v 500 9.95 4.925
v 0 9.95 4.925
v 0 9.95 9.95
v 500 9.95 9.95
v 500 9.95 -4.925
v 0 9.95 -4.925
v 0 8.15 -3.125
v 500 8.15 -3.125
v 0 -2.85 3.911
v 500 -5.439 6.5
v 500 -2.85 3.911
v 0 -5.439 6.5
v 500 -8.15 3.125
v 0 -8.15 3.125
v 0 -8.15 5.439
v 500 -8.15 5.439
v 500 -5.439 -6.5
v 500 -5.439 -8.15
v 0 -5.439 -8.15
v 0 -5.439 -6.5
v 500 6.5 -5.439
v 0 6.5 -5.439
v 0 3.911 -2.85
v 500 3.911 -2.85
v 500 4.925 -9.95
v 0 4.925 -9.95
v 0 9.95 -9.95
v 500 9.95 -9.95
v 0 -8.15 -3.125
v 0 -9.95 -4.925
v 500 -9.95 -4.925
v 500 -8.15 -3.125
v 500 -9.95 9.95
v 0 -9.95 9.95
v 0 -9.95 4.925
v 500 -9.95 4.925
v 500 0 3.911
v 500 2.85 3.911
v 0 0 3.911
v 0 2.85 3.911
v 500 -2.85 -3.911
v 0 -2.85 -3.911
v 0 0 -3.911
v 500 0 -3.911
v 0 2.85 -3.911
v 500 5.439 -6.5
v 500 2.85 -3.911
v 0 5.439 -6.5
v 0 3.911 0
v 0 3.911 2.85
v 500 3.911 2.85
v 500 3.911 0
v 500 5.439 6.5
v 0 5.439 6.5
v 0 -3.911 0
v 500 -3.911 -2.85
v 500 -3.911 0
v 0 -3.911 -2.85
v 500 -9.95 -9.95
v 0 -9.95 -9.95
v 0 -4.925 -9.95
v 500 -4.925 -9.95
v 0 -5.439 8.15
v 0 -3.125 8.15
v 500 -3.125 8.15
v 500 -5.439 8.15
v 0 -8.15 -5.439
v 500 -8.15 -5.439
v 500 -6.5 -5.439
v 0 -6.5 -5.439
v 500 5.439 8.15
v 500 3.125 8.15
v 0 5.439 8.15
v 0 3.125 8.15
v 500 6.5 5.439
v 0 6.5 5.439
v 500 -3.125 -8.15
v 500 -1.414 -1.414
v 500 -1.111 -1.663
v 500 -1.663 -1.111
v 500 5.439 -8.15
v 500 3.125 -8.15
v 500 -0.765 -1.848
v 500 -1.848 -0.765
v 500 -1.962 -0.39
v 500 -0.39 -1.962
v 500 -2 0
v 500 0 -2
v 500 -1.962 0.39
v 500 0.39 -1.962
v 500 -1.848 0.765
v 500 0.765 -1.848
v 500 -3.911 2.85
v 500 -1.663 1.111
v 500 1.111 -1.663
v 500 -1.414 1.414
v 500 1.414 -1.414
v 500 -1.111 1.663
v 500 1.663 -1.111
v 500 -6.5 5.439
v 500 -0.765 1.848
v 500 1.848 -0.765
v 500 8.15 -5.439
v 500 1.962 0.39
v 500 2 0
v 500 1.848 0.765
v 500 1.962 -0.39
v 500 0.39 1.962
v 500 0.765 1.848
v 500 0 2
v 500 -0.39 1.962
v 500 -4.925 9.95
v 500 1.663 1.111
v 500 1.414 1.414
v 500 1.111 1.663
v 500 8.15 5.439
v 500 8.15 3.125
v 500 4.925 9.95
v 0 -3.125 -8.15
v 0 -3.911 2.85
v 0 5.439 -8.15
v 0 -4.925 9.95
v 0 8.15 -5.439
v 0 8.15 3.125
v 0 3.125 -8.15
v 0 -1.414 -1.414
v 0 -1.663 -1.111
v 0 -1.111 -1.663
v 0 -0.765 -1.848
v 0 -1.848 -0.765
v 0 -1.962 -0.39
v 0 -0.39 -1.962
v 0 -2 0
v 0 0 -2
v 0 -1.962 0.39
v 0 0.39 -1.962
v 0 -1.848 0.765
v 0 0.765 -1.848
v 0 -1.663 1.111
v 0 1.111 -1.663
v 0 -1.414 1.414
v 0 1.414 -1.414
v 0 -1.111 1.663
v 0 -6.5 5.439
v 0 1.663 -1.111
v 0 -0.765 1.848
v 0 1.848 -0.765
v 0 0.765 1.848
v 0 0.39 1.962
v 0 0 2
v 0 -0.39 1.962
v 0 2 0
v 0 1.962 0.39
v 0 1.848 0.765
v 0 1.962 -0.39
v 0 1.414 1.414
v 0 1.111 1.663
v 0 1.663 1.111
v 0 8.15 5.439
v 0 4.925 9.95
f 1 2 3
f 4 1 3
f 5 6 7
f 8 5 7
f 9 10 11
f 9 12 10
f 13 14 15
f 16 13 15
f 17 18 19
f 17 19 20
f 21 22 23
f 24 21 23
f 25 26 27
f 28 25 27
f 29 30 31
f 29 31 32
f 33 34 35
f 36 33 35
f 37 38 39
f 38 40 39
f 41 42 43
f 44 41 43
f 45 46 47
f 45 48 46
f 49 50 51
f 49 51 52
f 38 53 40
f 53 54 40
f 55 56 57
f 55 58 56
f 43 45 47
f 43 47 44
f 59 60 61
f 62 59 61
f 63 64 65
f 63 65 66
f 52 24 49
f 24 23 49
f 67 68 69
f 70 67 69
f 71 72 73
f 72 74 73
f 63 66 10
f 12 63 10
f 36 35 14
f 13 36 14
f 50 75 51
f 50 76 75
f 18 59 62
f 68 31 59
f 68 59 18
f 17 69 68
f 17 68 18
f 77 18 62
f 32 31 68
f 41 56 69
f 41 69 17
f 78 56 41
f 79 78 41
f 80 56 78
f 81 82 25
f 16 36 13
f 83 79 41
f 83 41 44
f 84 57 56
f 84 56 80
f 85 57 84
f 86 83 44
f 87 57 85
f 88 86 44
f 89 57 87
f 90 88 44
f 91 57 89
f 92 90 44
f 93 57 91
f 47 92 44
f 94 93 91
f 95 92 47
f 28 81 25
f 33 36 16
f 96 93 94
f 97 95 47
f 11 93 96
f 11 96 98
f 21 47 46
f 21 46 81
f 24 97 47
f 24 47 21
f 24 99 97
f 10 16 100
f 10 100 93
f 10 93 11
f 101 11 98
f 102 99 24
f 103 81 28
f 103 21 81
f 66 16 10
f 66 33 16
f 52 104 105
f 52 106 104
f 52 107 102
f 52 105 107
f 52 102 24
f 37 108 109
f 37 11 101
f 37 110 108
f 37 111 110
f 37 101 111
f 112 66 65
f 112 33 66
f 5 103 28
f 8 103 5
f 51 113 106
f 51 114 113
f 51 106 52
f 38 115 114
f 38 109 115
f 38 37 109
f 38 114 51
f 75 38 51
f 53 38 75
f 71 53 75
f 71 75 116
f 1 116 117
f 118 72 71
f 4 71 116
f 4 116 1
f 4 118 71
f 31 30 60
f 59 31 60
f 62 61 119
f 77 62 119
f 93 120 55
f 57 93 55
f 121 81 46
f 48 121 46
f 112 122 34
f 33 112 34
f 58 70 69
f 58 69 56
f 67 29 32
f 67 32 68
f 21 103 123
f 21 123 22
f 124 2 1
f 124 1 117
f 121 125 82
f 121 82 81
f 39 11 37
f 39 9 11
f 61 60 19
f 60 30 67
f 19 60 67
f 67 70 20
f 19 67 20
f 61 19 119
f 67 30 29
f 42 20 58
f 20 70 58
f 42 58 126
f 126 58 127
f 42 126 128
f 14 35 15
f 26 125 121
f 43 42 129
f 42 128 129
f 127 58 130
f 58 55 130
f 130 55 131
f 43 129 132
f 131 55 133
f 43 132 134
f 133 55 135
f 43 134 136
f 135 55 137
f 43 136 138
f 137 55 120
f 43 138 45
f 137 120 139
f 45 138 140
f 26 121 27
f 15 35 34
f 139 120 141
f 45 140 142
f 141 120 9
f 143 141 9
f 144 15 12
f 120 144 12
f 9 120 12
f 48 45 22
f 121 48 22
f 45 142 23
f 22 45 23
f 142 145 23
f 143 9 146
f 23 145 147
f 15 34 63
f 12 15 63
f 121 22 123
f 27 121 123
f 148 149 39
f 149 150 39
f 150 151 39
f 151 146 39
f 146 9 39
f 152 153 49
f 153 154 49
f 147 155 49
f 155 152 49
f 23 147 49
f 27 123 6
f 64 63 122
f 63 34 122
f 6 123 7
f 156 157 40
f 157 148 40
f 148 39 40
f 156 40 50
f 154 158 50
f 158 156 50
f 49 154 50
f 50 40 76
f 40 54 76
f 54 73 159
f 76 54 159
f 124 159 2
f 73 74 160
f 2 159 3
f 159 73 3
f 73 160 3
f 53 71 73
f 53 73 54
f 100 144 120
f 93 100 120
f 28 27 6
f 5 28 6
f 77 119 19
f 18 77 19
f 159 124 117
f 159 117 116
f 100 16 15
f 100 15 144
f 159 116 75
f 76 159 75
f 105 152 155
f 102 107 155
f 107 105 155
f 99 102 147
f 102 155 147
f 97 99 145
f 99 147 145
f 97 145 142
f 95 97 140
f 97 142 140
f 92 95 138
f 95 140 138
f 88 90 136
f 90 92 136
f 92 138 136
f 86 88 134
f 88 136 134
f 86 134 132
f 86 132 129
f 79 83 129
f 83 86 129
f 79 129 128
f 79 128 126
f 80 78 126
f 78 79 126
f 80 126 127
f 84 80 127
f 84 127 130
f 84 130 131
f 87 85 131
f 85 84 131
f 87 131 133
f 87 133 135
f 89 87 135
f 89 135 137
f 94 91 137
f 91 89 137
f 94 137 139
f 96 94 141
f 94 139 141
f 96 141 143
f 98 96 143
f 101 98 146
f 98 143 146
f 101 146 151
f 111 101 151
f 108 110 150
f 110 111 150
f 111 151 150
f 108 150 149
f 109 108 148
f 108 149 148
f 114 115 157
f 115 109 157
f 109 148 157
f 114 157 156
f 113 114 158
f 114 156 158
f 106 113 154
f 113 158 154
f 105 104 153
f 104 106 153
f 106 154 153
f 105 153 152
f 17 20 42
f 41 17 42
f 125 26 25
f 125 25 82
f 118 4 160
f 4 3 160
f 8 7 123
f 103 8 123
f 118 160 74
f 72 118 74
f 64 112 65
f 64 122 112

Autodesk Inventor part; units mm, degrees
ref_plane "YZ Plane" through (0, 0, 0) normal (1, 0, 0) x (0, 1, 0)
ref_plane "XZ Plane" through (0, 0, 0) normal (0, 1, 0) x (-1, 0, 0)
ref_plane "XY Plane" through (0, 0, 0) normal (0, 0, 1) x (1, 0, 0)
sketch "Sketch1" plane through (0, 0, 0) normal (1, 0, 0) x (0, 1, 0)
  line L0 (-9.95, -9.95) -> (9.95, -9.95) construction
  line L1 (9.95, 9.95) -> (-9.95, 9.95) construction
  line L2 (-9.95, 9.95) -> (-9.95, -9.95) construction
  line L3 (-9.95, -9.95) -> (9.95, 9.95) construction
  line L4 (9.95, -9.95) -> (-9.95, 9.95) construction
  line L5 (9.95, 4.925) -> (8.15, 3.125)
  line L6 (8.15, 3.125) -> (8.15, 5.4393)
  line L7 (8.15, 5.4393) -> (6.5, 5.4393)
  line L8 (6.5, 5.4393) -> (3.9107, 2.85)
  line L9 (3.9107, 2.85) -> (3.9107, 0)
  line L10 (9.95, -4.925) -> (8.15, -3.125)
  line L11 (8.15, -3.125) -> (8.15, -5.4393)
  line L12 (3.9107, -2.85) -> (3.9107, 0)
  line L13 (0, 0) -> (6.8658, 0) construction
  line L14 (8.15, -5.4393) -> (6.5, -5.4393)
  line L15 (6.5, -5.4393) -> (3.9107, -2.85)
  circle A0 centre (0, 0) radius 2
  line L16 (9.95, -9.95) -> (9.95, -4.925)
  line L17 (9.95, 4.925) -> (9.95, 9.95)
  line L18 (-4.925, 9.95) -> (-9.95, 9.95)
  line L19 (-4.925, 9.95) -> (-3.125, 8.15)
  line L20 (-5.4393, 6.5) -> (-2.85, 3.9107)
  line L21 (-5.4393, 8.15) -> (-5.4393, 6.5)
  line L22 (-3.125, 8.15) -> (-5.4393, 8.15)
  line L23 (-2.85, 3.9107) -> (0, 3.9107)
  line L24 (2.85, 3.9107) -> (0, 3.9107)
  line L25 (5.4393, 6.5) -> (2.85, 3.9107)
  line L26 (5.4393, 8.15) -> (5.4393, 6.5)
  line L27 (3.125, 8.15) -> (5.4393, 8.15)
  line L28 (4.925, 9.95) -> (3.125, 8.15)
  line L29 (9.95, 9.95) -> (4.925, 9.95)
  line L30 (-9.95, -4.925) -> (-9.95, -9.95)
  line L31 (-9.95, -4.925) -> (-8.15, -3.125)
  line L32 (-6.5, -5.4393) -> (-3.9107, -2.85)
  line L33 (-8.15, -5.4393) -> (-6.5, -5.4393)
  line L34 (-8.15, -3.125) -> (-8.15, -5.4393)
  line L35 (-3.9107, -2.85) -> (-3.9107, 0)
  line L36 (-3.9107, 2.85) -> (-3.9107, 0)
  line L37 (-6.5, 5.4393) -> (-3.9107, 2.85)
  line L38 (-8.15, 5.4393) -> (-6.5, 5.4393)
  line L39 (-8.15, 3.125) -> (-8.15, 5.4393)
  line L40 (-9.95, 4.925) -> (-8.15, 3.125)
  line L41 (-9.95, 9.95) -> (-9.95, 4.925)
  line L42 (4.925, -9.95) -> (9.95, -9.95)
  line L43 (4.925, -9.95) -> (3.125, -8.15)
  line L44 (5.4393, -6.5) -> (2.85, -3.9107)
  line L45 (5.4393, -8.15) -> (5.4393, -6.5)
  line L46 (3.125, -8.15) -> (5.4393, -8.15)
  line L47 (2.85, -3.9107) -> (0, -3.9107)
  line L48 (-2.85, -3.9107) -> (0, -3.9107)
  line L49 (-5.4393, -6.5) -> (-2.85, -3.9107)
  line L50 (-5.4393, -8.15) -> (-5.4393, -6.5)
  line L51 (-3.125, -8.15) -> (-5.4393, -8.15)
  line L52 (-4.925, -9.95) -> (-3.125, -8.15)
  line L53 (-9.95, -9.95) -> (-4.925, -9.95)
  dimension "d0" = 19.9
  dimension "d1" = 19.9
  dimension "d3" = 6.25
  dimension "d4" = 5.7
  dimension "d5" = 0.75
  dimension "d7" = 4
  dimension "d8" = 1.8
  dimension "d9" = 45
  dimension "d10" = 1.65
  dimension "d13" = 360
extrude "Extrusion1" add sketch "Sketch1" along normal blind 500
properties part number "V Extrustion 20x500mm"
